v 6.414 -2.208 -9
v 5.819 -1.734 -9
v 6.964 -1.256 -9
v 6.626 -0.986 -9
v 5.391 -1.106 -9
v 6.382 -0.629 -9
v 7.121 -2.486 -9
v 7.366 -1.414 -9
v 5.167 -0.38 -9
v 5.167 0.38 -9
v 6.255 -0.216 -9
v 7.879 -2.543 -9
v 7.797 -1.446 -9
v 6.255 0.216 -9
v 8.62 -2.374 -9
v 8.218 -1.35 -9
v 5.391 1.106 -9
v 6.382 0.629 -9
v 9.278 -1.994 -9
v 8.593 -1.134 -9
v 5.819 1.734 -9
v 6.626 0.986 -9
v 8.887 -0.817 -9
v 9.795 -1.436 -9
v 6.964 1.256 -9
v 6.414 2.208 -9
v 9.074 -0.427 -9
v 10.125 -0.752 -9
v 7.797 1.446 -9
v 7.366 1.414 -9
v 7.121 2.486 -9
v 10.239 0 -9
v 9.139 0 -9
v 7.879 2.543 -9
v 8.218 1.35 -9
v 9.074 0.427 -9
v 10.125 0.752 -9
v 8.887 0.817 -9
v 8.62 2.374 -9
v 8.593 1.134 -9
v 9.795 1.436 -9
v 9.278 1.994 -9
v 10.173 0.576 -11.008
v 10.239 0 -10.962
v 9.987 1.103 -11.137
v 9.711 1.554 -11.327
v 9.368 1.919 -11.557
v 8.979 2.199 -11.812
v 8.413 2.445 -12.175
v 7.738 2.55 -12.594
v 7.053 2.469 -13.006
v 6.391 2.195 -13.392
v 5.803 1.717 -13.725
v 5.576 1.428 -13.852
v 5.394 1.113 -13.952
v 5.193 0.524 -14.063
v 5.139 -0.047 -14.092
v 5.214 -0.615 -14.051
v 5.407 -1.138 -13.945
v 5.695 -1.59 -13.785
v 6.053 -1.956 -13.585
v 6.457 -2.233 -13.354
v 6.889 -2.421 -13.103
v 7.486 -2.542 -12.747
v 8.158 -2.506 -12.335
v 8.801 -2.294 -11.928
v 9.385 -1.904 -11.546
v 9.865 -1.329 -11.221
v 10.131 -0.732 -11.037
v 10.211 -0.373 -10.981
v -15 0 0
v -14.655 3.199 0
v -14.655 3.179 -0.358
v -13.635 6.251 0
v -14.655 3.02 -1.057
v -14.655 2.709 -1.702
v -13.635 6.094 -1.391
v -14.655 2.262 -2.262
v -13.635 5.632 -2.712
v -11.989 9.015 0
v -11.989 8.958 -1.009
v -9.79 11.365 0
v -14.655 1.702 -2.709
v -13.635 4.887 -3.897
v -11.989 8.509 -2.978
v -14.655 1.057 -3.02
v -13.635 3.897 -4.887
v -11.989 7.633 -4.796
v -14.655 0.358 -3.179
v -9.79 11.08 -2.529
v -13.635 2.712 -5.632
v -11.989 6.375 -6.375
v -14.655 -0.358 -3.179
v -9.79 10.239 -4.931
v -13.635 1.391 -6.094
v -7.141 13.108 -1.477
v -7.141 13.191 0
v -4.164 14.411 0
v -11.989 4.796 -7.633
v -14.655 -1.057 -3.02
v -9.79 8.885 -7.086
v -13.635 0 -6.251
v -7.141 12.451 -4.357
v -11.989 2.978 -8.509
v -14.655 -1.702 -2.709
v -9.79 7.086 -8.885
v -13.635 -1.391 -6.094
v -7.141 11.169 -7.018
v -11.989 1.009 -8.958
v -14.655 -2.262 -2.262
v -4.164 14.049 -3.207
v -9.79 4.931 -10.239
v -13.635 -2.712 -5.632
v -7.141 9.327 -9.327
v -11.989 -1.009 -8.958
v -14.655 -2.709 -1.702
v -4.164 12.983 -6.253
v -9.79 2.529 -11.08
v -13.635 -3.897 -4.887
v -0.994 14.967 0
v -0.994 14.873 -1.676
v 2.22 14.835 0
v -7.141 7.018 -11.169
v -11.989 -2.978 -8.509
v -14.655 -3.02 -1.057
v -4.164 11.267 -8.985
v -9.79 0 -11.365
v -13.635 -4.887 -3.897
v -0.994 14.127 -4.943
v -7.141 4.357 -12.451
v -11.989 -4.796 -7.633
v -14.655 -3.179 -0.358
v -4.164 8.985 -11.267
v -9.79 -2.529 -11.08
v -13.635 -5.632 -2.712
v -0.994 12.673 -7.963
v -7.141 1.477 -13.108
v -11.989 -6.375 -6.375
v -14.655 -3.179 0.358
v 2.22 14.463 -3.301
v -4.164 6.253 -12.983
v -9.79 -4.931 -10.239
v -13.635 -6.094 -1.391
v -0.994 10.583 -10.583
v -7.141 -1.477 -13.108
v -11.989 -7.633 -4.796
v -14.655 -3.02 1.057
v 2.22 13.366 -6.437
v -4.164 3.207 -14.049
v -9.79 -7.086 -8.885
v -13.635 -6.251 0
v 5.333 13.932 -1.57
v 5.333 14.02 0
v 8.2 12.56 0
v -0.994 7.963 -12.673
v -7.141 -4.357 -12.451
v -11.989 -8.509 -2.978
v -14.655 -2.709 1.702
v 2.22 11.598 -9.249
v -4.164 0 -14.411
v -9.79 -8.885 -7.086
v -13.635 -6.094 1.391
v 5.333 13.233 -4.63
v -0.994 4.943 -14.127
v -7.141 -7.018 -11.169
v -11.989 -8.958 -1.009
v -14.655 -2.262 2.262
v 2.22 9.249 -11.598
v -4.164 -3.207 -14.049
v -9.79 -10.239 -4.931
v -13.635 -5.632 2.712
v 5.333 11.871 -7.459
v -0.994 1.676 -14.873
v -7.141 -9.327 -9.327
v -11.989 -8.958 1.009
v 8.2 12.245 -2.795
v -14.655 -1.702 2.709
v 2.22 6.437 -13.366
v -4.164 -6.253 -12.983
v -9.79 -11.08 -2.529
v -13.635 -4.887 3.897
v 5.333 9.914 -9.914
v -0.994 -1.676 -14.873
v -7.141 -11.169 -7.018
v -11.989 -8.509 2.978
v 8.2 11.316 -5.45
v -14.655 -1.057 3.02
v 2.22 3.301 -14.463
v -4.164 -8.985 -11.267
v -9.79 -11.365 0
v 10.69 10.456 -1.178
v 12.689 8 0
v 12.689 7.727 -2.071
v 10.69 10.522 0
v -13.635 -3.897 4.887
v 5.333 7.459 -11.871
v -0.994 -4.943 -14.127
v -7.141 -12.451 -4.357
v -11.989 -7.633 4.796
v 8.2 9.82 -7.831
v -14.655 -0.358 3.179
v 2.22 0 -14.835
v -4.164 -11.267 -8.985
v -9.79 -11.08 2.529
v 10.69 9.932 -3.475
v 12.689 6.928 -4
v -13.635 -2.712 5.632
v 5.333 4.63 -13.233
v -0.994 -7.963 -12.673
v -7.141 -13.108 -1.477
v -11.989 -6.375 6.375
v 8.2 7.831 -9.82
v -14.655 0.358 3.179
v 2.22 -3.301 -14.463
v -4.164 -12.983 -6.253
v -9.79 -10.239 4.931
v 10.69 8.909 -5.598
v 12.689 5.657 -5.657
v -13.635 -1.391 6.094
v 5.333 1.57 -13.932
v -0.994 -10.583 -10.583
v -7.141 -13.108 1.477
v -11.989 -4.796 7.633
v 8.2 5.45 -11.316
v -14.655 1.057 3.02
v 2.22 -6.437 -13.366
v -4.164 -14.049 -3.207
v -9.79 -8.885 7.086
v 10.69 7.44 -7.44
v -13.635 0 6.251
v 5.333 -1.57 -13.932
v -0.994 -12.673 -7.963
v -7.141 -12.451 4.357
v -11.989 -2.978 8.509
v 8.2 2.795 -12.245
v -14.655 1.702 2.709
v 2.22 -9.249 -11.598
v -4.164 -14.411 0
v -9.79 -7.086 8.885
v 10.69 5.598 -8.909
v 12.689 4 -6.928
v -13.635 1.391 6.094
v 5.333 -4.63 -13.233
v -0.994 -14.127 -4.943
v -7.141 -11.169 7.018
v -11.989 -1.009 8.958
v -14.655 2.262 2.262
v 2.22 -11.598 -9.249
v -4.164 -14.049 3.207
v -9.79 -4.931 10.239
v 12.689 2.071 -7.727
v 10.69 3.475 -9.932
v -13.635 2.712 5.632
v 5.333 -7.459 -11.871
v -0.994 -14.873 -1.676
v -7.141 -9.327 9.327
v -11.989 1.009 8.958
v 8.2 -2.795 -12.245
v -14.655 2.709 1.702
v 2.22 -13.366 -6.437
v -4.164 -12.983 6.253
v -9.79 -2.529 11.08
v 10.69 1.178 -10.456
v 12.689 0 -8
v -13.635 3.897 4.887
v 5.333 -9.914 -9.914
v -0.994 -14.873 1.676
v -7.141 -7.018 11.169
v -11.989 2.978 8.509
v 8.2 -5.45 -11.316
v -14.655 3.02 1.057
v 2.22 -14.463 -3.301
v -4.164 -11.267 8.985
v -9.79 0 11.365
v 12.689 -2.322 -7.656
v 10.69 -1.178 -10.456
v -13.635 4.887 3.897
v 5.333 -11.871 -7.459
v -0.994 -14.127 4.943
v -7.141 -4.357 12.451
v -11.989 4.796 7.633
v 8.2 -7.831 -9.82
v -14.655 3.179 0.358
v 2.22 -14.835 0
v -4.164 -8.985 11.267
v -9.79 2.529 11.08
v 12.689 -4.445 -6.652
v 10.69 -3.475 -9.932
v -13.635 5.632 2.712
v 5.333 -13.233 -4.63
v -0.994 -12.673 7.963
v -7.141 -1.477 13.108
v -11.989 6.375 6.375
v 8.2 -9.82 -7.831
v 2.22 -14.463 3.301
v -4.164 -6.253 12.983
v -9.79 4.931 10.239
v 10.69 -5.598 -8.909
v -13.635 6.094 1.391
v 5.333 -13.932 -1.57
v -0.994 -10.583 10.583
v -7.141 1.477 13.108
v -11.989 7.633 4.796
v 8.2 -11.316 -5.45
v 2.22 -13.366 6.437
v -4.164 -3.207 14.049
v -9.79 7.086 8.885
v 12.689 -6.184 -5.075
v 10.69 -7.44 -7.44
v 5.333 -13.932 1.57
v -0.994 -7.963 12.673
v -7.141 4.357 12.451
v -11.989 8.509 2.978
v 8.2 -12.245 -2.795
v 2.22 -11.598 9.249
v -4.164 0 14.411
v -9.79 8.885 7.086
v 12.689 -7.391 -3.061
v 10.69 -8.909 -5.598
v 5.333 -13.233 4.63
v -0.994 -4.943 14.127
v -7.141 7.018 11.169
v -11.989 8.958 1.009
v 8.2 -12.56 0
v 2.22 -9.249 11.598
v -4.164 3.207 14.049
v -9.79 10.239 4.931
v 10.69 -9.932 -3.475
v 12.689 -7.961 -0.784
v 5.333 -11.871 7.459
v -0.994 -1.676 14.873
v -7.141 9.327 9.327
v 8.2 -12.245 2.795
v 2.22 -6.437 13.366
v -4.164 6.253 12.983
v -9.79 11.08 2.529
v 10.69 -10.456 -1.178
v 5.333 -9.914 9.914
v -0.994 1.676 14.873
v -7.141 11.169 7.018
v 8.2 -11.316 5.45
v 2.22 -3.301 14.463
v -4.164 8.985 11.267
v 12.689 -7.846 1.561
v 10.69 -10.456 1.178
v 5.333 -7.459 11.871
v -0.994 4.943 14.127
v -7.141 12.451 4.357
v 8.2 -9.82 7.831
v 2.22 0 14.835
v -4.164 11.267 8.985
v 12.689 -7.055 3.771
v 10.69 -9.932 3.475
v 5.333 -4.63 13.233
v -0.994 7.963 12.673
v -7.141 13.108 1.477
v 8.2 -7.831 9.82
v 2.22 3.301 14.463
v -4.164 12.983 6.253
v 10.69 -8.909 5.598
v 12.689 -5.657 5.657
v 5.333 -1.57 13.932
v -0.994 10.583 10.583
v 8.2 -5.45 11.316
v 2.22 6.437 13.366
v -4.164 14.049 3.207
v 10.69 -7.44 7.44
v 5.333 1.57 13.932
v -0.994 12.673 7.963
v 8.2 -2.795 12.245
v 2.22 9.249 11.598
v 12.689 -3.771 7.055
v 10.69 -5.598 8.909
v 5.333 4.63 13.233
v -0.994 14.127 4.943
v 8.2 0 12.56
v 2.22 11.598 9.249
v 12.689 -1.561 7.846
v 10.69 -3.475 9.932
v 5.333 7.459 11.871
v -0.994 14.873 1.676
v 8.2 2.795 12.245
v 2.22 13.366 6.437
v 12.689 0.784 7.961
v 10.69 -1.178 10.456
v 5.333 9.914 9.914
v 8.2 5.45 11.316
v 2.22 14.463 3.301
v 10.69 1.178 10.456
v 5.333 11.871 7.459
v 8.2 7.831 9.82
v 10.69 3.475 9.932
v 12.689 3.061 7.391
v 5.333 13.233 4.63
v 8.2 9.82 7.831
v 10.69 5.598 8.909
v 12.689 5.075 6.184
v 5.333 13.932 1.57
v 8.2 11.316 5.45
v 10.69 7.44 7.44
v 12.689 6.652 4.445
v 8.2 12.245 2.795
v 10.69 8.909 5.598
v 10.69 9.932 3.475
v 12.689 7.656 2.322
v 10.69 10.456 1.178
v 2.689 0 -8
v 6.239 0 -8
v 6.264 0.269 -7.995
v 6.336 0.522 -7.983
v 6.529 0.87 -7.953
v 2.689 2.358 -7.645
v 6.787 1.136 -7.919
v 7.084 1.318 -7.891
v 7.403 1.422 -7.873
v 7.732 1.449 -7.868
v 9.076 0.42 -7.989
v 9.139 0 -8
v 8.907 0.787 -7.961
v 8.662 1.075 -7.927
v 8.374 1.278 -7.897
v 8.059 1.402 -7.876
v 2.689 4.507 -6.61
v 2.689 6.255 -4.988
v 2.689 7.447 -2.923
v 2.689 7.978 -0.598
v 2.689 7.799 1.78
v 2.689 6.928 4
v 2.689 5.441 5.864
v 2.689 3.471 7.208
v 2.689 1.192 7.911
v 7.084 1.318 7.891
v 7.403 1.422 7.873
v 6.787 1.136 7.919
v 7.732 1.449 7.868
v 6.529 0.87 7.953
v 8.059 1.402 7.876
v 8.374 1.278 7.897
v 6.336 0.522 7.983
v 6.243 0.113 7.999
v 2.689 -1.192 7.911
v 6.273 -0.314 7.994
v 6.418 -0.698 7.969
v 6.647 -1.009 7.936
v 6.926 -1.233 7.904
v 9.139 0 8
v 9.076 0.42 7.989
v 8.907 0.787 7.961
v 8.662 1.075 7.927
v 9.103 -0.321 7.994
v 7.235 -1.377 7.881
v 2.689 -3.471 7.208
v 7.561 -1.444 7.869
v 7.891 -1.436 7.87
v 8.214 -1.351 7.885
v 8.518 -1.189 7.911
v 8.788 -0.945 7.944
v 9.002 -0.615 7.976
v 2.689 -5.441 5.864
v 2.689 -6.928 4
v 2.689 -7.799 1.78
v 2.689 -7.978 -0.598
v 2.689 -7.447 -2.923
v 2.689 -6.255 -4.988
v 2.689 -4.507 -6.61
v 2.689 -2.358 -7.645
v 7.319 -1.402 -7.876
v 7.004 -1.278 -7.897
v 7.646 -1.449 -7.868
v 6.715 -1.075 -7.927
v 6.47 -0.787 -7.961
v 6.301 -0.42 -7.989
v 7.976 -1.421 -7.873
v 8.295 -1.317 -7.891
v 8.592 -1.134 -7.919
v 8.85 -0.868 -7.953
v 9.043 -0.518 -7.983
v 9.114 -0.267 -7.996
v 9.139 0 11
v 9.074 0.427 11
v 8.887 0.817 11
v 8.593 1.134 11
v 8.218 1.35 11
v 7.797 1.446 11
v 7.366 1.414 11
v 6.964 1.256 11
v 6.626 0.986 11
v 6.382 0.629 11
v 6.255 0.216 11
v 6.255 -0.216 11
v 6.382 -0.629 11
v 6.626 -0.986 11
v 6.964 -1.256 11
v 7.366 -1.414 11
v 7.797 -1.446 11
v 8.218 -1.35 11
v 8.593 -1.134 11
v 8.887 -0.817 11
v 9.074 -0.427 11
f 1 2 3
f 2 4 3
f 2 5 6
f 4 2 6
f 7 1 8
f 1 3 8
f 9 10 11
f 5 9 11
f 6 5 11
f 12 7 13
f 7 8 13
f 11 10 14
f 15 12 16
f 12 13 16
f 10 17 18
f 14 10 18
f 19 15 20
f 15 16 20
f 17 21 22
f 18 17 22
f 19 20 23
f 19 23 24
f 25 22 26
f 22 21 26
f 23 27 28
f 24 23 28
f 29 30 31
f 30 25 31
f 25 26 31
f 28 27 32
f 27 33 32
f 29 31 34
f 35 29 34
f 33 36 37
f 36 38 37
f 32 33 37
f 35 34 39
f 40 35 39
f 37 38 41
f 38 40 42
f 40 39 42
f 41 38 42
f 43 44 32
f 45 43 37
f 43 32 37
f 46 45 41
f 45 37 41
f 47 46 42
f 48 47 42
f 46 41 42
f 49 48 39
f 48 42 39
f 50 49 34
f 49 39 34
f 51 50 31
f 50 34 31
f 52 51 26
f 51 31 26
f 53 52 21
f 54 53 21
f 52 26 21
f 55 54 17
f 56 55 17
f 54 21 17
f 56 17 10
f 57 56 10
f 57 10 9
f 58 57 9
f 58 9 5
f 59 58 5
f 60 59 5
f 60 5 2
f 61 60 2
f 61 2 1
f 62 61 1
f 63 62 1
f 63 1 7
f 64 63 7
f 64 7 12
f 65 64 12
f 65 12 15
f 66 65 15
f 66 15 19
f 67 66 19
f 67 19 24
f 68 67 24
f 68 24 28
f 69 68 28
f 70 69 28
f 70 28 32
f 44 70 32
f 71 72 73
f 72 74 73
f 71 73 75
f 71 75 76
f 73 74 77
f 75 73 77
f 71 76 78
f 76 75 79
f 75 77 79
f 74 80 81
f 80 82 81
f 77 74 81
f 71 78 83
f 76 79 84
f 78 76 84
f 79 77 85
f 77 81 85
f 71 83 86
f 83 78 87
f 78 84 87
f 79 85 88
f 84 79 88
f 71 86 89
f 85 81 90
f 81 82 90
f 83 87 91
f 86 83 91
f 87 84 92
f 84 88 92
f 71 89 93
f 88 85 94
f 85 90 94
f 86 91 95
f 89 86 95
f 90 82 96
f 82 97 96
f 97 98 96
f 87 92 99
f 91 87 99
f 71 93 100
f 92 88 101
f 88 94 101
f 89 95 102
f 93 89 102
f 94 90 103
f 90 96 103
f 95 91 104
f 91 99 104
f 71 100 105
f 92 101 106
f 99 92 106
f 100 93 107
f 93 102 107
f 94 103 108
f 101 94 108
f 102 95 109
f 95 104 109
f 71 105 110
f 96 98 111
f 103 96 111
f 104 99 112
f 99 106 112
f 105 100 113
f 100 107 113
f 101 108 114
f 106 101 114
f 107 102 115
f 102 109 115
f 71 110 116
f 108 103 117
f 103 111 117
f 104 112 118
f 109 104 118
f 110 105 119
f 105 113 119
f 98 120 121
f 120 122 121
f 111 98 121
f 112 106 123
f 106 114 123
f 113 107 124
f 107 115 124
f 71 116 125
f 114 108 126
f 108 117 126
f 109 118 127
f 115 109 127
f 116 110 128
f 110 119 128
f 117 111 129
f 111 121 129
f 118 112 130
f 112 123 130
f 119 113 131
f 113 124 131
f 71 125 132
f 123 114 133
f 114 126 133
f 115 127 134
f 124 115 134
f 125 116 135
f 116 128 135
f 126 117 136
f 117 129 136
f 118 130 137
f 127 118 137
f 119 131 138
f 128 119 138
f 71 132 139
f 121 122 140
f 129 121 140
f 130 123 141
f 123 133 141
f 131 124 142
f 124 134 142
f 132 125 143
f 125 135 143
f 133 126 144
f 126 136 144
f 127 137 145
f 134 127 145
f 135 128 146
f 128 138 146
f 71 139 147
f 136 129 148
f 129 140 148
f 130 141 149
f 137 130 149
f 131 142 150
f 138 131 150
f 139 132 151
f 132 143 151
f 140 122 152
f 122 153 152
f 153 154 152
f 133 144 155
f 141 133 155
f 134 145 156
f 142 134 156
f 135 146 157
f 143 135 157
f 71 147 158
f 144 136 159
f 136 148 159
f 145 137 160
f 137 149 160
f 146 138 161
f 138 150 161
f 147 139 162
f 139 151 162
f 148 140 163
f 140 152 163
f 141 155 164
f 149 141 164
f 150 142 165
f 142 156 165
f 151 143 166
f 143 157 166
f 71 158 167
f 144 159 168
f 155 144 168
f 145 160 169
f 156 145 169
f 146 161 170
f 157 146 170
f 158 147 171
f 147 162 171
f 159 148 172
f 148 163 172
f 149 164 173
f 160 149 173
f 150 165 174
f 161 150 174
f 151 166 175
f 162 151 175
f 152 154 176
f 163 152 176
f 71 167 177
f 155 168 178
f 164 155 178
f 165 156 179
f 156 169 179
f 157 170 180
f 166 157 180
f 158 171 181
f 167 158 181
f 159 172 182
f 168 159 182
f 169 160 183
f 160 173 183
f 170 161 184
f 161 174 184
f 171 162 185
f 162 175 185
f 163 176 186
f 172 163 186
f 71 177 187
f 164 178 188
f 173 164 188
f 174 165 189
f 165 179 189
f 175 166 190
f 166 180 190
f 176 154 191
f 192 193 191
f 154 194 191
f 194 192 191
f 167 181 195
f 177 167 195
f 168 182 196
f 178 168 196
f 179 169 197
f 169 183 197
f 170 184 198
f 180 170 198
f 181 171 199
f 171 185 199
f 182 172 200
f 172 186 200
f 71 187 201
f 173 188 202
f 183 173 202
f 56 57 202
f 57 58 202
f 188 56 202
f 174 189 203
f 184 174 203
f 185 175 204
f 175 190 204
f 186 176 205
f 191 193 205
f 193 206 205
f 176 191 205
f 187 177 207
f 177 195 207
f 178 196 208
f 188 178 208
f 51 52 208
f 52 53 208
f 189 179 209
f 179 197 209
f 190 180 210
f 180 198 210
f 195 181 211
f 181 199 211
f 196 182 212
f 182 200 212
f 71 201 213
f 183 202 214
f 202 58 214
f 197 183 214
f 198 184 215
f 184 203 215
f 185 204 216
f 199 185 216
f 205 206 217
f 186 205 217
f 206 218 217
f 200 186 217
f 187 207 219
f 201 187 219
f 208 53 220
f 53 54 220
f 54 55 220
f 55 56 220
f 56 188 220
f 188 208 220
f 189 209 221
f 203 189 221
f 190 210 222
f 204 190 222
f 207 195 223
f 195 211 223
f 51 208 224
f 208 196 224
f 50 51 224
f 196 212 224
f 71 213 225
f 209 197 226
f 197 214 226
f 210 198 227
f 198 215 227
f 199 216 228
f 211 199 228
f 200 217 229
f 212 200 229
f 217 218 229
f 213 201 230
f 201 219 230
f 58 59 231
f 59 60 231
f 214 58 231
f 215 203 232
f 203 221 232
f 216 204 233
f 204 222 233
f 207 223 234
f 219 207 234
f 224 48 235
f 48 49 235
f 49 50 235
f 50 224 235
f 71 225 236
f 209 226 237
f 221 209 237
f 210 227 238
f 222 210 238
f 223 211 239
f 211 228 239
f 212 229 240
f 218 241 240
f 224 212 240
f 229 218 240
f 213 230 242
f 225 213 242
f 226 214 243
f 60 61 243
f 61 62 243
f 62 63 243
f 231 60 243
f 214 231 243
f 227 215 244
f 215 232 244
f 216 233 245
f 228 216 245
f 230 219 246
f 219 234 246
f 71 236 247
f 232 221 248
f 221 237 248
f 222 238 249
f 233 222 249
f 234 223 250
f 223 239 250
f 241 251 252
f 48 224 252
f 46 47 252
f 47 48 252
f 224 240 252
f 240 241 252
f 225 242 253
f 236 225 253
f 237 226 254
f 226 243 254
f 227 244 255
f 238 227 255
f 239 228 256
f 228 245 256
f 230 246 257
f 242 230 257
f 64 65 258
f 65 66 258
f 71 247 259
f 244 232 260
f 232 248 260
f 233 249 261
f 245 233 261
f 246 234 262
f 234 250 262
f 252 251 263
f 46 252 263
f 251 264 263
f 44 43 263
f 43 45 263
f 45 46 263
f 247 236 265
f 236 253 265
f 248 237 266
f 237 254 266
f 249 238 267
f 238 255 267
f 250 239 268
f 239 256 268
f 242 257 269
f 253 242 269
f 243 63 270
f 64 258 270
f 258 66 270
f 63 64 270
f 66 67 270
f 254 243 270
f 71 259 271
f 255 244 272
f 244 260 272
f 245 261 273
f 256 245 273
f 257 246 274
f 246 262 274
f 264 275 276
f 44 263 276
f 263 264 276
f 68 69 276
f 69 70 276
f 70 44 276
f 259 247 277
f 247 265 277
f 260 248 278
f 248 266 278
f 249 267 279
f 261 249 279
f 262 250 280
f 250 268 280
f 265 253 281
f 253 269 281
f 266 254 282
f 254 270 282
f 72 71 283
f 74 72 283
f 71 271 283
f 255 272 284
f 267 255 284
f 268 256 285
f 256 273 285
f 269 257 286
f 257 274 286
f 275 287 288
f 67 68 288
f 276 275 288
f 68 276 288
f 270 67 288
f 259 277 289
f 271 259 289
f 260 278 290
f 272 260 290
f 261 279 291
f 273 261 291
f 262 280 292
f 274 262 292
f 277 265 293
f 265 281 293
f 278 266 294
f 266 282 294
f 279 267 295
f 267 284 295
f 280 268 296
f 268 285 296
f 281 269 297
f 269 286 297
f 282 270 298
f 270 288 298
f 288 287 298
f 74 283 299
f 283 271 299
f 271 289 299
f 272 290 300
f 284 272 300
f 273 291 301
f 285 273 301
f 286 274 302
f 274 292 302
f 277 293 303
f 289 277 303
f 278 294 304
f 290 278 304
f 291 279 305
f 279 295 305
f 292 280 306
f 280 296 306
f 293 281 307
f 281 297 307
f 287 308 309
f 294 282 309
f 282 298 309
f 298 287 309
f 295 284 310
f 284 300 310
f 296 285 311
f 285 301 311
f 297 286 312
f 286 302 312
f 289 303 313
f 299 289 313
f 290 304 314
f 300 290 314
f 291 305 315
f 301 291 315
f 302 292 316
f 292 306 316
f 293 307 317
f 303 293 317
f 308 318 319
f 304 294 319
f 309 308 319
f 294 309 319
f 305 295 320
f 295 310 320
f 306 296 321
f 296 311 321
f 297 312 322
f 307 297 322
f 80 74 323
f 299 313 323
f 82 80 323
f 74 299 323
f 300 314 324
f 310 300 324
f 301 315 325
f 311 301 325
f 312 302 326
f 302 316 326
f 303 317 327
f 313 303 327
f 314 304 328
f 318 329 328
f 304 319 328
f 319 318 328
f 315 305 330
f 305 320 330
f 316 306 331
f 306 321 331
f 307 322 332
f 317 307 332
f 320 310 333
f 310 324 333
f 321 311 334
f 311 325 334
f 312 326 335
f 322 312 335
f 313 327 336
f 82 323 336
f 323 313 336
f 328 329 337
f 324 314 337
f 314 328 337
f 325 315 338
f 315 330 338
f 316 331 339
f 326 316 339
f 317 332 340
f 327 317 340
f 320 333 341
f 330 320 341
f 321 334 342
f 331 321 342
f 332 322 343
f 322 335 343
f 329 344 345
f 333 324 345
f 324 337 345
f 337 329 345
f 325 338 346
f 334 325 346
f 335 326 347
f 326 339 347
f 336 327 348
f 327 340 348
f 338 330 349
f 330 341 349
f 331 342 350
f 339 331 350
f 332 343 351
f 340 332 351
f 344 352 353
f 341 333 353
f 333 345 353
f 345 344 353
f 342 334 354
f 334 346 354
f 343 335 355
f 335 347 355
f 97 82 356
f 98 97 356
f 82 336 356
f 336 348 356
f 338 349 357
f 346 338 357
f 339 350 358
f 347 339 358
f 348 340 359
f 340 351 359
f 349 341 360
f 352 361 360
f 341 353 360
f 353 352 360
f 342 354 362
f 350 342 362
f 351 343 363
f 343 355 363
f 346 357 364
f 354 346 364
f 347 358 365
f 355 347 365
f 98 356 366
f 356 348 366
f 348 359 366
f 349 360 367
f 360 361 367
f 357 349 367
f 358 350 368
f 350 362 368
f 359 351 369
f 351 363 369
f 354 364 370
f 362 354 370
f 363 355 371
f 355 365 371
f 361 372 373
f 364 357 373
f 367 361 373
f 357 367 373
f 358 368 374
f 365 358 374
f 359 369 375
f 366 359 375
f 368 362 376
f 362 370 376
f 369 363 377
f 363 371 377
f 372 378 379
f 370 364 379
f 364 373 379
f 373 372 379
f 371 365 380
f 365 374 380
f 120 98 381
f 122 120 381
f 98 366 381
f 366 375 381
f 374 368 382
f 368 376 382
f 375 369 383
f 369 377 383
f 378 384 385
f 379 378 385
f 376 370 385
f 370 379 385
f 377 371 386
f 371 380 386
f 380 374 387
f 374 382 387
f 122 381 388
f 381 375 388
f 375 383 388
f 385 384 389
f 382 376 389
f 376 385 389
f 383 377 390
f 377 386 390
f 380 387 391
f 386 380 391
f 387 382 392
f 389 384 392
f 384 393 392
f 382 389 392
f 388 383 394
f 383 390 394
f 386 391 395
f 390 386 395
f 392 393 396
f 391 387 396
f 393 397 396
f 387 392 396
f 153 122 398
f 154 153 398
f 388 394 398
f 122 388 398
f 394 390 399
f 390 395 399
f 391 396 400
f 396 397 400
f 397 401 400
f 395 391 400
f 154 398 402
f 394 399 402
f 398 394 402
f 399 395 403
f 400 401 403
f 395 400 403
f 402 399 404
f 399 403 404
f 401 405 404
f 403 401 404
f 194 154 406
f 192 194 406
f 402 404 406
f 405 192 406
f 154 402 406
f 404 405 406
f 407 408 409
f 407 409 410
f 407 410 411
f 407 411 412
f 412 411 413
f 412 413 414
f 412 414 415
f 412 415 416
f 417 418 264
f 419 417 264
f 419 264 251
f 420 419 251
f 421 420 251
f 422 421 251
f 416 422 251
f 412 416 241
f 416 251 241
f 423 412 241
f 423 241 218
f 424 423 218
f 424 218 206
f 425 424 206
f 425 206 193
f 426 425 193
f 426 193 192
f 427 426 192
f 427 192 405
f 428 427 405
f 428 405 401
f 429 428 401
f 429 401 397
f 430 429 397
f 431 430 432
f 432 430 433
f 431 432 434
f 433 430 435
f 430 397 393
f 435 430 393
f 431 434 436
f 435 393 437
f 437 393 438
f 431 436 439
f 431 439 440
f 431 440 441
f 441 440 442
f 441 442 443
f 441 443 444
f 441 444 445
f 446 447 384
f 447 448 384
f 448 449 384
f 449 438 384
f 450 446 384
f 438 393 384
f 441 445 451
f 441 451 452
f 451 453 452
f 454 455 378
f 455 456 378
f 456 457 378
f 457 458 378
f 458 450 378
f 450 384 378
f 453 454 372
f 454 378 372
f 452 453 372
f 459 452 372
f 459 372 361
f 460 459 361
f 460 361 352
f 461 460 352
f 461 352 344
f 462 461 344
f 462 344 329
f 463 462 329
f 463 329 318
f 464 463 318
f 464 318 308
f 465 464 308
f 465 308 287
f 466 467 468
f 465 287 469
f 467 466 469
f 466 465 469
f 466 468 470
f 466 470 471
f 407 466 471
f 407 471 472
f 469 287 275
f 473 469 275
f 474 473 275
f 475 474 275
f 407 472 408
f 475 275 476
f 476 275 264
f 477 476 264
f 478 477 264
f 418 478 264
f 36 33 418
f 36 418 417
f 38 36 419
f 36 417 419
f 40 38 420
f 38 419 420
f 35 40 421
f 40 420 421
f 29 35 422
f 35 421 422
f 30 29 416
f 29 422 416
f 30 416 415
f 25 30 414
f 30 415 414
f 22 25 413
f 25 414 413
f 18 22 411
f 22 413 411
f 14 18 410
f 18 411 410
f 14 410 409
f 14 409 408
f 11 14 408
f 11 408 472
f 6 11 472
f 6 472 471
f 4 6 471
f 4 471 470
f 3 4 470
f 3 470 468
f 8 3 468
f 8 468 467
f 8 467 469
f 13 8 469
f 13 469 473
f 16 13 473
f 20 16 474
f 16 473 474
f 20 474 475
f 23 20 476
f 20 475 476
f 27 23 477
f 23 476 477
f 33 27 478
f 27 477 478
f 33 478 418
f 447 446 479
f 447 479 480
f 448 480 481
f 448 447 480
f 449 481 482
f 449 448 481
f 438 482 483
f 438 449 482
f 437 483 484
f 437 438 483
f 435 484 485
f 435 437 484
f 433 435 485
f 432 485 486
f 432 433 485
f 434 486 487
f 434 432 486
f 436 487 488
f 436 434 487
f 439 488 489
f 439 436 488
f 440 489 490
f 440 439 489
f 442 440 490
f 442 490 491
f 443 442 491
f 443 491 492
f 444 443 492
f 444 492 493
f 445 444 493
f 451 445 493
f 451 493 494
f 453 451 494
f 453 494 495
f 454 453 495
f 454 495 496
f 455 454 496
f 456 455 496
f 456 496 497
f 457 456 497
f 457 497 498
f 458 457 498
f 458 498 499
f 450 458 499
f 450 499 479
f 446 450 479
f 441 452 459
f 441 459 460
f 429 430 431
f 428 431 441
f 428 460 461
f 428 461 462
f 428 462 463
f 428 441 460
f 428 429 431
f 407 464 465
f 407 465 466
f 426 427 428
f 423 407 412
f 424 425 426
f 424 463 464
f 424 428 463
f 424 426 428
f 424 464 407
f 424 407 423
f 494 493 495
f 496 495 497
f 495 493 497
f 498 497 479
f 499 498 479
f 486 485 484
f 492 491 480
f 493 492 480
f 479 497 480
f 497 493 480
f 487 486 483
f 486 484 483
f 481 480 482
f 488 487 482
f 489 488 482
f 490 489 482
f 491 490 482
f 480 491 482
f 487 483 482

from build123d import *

# Parameters (mm, degrees)
SKETCH_2_R               = 8
CUT_EXTRUDE_1_DEPTH      = 10
SKETCH_3_R               = 1.45
CUT_EXTRUDE_4_DEPTH      = 11
CUT_EXTRUDE_4_DEPTH_BACK = 9
CUT_EXTRUDE_5_REACH      = 8
SKETCH_5_R               = 2.55


with BuildPart() as part:
    # 草图1 → 旋转8 (revolve)
    with BuildSketch(Plane.XY):
        with BuildLine():
            Line((12.68857754, 8), (12.68857754, 0))
            Line((12.68857754, 0), (-15, 0))
            ThreePointArc((-15, 0), (-4.163612428, 14.410563193), (12.68857754, 8))
        make_face()
    revolve(axis=Axis((12.68857754, 0, 0), (-1, 0, 0)))

    # 草图2 → 切除-拉伸1 (cut)
    with BuildSketch(Plane(origin=(12.68857754, 0, 0), x_dir=(0, 0, -1), z_dir=(1, 0, 0))):
        Circle(SKETCH_2_R)
    extrude(amount=-CUT_EXTRUDE_1_DEPTH, mode=Mode.SUBTRACT)

    # 草图3 → 切除-拉伸4 (cut, two sides)
    with BuildSketch(Plane.XY) as cut_extrude_4_sk:
        with Locations((7.68857754, 0)):
            Circle(SKETCH_3_R)
    extrude(amount=CUT_EXTRUDE_4_DEPTH, mode=Mode.SUBTRACT)
    extrude(cut_extrude_4_sk.sketch, amount=-CUT_EXTRUDE_4_DEPTH_BACK, mode=Mode.SUBTRACT)

    # 草图5 → 切除-拉伸5 (cut, up to next)
    with BuildSketch(Plane.XY.offset(-9), mode=Mode.PRIVATE) as cut_extrude_5_sk1:
        with Locations((7.68857754, 0)):
            Circle(SKETCH_5_R)
    cut_extrude_5_tool1 = extrude(cut_extrude_5_sk1.sketch, amount=-CUT_EXTRUDE_5_REACH, mode=Mode.PRIVATE) & part.part
    add(cut_extrude_5_tool1.solids().sort_by_distance((7.688578, 0, -9))[0], mode=Mode.SUBTRACT)


solid = part.part
